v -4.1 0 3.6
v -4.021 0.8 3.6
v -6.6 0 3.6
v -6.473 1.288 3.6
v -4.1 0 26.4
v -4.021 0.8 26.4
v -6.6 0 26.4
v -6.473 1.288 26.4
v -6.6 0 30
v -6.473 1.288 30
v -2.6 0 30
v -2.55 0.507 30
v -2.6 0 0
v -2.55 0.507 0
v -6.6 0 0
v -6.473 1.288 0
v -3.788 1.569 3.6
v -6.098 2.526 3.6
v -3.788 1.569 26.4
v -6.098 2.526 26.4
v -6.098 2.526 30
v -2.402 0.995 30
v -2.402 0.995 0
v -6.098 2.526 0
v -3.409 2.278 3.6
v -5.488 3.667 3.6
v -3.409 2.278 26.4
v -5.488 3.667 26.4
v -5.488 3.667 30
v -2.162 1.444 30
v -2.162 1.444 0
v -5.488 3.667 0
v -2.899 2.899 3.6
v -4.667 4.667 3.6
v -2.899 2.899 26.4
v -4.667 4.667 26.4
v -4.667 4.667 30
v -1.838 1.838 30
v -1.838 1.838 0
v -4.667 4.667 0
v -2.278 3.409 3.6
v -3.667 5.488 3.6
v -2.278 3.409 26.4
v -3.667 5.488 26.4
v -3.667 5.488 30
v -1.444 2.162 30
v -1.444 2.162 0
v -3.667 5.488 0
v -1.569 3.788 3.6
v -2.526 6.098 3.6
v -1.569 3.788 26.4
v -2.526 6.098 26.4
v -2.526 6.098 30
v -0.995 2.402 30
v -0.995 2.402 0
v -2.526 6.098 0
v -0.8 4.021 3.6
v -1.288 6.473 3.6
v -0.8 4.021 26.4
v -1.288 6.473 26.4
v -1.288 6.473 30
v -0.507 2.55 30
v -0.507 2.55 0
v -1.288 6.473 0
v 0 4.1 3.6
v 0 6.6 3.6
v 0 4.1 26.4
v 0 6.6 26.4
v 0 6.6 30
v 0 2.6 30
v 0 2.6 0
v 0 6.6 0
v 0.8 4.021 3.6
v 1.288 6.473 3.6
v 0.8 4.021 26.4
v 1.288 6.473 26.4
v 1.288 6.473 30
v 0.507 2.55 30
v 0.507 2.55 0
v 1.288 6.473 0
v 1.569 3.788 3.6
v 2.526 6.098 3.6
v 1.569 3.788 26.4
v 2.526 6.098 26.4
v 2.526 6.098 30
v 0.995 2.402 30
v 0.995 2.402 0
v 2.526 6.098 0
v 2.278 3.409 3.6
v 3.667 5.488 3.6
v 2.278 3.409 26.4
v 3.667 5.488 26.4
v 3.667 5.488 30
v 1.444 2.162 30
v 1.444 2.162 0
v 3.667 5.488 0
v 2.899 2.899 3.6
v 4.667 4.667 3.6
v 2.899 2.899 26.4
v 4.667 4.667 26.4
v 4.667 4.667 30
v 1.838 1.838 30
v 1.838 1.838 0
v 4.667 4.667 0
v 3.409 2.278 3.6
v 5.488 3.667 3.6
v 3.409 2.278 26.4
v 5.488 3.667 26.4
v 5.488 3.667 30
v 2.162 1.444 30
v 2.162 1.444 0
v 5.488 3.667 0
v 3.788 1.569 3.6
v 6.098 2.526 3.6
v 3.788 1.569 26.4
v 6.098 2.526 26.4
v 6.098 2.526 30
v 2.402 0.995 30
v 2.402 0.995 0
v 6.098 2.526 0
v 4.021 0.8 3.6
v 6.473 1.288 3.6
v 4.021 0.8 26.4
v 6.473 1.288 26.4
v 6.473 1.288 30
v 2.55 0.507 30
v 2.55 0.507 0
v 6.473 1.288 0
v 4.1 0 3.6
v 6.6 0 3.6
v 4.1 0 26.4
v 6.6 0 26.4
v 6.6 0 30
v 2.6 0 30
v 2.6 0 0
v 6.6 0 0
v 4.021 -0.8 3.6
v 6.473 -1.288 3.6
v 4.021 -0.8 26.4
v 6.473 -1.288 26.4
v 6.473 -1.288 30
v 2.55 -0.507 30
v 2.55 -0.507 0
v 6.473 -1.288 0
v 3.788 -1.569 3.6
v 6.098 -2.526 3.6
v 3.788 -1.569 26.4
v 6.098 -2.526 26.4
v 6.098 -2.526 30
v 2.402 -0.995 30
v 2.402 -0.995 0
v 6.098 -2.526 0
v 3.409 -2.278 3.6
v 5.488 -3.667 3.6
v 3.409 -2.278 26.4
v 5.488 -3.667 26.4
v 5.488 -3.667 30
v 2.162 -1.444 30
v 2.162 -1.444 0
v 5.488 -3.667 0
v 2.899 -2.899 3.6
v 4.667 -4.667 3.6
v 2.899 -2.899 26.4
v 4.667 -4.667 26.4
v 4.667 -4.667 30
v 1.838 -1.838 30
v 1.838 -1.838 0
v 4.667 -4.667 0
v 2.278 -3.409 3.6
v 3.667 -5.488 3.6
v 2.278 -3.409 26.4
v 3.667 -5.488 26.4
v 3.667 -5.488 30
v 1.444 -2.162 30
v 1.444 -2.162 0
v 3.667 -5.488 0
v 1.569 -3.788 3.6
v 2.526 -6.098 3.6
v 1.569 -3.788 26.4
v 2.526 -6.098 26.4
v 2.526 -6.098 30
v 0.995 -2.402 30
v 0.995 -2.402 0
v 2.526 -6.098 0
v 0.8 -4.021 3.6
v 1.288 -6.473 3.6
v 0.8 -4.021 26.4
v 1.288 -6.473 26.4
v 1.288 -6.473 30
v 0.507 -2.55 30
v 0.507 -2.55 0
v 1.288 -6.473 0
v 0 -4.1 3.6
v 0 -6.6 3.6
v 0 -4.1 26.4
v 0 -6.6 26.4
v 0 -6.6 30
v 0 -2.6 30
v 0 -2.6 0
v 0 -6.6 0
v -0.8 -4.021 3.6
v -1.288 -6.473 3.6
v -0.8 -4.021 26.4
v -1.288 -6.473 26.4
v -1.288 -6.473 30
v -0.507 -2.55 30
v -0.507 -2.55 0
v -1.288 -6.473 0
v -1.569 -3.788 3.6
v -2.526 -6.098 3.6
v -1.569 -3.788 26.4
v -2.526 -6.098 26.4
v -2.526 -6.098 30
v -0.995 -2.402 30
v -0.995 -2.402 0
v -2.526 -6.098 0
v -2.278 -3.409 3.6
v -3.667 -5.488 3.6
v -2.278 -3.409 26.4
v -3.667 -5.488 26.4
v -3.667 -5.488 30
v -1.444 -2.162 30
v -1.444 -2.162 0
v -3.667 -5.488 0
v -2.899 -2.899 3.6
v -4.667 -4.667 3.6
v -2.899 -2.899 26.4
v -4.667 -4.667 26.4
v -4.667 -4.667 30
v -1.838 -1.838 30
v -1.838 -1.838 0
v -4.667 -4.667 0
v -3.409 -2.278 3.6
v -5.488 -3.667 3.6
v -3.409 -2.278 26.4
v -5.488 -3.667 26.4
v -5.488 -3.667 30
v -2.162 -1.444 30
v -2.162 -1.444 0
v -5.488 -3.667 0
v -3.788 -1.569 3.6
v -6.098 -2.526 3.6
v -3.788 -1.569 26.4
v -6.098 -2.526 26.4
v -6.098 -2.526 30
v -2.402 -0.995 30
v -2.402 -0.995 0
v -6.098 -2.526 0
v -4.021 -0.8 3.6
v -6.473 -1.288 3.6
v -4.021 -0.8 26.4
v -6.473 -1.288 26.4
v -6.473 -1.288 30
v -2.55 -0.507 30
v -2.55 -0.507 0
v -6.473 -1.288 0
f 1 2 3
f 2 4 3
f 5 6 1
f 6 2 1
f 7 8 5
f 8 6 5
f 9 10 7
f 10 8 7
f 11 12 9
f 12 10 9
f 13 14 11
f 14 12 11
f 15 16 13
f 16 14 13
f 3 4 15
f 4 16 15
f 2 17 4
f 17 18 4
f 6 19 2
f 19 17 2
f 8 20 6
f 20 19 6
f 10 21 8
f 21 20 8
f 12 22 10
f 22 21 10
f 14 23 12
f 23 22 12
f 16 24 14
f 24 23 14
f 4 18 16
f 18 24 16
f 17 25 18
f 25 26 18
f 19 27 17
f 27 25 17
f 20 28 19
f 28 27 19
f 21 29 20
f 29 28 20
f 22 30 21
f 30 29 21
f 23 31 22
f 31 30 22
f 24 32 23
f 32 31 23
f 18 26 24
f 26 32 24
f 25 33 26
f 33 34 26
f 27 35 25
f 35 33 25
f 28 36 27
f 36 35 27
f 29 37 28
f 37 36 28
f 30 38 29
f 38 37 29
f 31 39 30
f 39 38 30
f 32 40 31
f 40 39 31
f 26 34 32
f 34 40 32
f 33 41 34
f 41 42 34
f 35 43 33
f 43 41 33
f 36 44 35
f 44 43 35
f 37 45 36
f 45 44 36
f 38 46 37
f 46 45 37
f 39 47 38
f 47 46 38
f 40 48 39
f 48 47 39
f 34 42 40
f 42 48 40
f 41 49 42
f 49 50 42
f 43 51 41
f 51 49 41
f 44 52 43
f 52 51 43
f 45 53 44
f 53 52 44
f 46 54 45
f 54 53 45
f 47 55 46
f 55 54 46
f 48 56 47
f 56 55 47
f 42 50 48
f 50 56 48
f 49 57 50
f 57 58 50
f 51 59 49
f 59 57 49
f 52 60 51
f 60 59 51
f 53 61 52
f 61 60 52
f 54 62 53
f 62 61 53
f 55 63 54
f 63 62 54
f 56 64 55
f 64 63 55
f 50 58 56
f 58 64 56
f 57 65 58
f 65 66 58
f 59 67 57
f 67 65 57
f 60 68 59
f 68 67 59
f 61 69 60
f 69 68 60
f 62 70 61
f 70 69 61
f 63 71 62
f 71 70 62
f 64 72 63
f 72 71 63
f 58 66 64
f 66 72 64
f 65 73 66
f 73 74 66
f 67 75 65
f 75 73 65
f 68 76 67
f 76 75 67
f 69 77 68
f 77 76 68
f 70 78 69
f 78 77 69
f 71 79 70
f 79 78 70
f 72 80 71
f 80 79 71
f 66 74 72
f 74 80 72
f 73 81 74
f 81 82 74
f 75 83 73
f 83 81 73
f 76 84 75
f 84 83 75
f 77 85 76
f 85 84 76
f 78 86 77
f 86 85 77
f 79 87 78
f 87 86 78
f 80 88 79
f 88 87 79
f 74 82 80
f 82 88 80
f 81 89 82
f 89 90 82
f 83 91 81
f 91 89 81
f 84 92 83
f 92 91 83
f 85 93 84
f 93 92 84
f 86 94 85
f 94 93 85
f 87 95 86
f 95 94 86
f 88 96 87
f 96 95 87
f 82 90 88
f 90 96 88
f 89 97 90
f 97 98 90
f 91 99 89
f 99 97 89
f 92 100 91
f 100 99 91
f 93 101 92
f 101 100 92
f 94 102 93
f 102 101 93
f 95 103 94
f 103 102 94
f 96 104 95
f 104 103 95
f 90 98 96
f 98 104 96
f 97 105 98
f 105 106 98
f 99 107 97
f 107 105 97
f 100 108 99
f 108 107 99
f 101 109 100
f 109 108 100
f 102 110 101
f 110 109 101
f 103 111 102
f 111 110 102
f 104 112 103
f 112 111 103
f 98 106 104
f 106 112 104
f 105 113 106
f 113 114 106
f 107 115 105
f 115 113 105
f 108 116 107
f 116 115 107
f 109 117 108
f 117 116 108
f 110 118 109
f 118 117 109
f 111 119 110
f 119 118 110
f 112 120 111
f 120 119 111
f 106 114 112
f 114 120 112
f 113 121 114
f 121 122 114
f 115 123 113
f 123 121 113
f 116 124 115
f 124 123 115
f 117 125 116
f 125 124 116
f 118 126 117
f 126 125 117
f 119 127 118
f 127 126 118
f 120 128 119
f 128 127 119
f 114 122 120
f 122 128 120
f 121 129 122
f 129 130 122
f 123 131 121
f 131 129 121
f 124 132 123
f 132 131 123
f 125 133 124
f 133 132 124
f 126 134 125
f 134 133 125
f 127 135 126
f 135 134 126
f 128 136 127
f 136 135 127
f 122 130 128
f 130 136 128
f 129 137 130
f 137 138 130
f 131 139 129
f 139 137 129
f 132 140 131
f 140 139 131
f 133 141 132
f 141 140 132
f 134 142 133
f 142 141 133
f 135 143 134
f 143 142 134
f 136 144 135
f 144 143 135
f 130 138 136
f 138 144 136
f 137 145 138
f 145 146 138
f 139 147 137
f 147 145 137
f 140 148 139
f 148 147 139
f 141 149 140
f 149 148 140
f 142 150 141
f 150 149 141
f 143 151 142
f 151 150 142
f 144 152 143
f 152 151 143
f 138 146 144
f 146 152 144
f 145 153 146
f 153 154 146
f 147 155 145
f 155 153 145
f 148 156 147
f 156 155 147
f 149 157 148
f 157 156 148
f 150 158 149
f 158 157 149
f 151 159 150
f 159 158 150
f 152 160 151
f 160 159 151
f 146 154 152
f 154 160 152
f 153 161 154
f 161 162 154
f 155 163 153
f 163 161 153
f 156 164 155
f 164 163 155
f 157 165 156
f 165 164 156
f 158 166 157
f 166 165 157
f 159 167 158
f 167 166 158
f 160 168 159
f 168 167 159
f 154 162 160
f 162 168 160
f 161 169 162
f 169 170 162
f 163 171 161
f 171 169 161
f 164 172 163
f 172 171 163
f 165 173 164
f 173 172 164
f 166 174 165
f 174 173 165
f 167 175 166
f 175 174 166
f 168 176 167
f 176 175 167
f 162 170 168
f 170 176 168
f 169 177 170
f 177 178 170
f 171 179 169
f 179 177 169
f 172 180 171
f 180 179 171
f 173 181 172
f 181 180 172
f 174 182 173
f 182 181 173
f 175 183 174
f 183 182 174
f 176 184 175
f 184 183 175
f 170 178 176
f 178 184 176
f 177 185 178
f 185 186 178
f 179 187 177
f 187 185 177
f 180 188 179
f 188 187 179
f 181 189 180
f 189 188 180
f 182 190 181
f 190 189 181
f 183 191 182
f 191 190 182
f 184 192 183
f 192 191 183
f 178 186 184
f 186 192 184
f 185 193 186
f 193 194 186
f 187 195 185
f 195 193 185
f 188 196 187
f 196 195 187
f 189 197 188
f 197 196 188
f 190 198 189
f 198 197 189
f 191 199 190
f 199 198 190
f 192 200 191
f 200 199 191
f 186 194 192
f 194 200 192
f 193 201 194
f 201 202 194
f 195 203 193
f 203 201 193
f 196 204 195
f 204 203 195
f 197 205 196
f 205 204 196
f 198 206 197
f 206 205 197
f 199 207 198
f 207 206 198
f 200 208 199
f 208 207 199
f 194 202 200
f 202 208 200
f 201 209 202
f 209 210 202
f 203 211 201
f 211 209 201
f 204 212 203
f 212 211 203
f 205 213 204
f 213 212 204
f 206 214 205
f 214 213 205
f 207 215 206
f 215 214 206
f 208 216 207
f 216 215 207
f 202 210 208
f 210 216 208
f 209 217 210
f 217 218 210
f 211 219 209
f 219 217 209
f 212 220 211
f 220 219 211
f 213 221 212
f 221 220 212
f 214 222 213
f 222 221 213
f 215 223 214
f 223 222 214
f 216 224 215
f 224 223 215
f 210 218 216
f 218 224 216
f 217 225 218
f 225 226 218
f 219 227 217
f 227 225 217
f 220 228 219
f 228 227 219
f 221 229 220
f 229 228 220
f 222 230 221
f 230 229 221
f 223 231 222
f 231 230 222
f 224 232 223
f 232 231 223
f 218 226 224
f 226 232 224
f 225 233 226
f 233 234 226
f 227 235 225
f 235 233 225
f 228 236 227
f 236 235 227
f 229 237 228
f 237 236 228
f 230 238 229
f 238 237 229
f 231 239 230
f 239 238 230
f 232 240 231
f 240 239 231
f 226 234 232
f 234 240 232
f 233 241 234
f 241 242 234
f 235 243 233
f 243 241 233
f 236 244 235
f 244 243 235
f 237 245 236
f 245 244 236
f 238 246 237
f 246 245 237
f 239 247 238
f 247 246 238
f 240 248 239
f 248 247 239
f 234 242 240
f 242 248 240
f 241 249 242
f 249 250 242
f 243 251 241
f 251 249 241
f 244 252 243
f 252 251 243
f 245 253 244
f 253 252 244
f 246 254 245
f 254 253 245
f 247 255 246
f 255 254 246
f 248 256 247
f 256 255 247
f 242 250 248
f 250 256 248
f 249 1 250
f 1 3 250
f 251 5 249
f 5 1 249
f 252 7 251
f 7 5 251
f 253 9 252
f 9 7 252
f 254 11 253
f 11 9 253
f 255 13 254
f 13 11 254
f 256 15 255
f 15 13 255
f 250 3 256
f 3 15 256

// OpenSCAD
$fn = 32;

// ----------------------------------------------------------------------
// Profiled standoff: spool spacer, 30 mm long, bore 5.2 mm
// ----------------------------------------------------------------------

// --- parameters (mm) ---
revolve_angle = 360;      // full turn around the Z axis
profile_points = 8;       // points of the closed outline

profile = [[2.6, 0], [6.6, 0], [6.6, 3.6], [4.1, 3.6], [4.1, 26.4], [6.6, 26.4], [6.6, 30], [2.6, 30]];  // single closed polygon, 8 points, counter clockwise

// --- the one profile operation ---
rotate_extrude(angle = revolve_angle) polygon(points = profile);
